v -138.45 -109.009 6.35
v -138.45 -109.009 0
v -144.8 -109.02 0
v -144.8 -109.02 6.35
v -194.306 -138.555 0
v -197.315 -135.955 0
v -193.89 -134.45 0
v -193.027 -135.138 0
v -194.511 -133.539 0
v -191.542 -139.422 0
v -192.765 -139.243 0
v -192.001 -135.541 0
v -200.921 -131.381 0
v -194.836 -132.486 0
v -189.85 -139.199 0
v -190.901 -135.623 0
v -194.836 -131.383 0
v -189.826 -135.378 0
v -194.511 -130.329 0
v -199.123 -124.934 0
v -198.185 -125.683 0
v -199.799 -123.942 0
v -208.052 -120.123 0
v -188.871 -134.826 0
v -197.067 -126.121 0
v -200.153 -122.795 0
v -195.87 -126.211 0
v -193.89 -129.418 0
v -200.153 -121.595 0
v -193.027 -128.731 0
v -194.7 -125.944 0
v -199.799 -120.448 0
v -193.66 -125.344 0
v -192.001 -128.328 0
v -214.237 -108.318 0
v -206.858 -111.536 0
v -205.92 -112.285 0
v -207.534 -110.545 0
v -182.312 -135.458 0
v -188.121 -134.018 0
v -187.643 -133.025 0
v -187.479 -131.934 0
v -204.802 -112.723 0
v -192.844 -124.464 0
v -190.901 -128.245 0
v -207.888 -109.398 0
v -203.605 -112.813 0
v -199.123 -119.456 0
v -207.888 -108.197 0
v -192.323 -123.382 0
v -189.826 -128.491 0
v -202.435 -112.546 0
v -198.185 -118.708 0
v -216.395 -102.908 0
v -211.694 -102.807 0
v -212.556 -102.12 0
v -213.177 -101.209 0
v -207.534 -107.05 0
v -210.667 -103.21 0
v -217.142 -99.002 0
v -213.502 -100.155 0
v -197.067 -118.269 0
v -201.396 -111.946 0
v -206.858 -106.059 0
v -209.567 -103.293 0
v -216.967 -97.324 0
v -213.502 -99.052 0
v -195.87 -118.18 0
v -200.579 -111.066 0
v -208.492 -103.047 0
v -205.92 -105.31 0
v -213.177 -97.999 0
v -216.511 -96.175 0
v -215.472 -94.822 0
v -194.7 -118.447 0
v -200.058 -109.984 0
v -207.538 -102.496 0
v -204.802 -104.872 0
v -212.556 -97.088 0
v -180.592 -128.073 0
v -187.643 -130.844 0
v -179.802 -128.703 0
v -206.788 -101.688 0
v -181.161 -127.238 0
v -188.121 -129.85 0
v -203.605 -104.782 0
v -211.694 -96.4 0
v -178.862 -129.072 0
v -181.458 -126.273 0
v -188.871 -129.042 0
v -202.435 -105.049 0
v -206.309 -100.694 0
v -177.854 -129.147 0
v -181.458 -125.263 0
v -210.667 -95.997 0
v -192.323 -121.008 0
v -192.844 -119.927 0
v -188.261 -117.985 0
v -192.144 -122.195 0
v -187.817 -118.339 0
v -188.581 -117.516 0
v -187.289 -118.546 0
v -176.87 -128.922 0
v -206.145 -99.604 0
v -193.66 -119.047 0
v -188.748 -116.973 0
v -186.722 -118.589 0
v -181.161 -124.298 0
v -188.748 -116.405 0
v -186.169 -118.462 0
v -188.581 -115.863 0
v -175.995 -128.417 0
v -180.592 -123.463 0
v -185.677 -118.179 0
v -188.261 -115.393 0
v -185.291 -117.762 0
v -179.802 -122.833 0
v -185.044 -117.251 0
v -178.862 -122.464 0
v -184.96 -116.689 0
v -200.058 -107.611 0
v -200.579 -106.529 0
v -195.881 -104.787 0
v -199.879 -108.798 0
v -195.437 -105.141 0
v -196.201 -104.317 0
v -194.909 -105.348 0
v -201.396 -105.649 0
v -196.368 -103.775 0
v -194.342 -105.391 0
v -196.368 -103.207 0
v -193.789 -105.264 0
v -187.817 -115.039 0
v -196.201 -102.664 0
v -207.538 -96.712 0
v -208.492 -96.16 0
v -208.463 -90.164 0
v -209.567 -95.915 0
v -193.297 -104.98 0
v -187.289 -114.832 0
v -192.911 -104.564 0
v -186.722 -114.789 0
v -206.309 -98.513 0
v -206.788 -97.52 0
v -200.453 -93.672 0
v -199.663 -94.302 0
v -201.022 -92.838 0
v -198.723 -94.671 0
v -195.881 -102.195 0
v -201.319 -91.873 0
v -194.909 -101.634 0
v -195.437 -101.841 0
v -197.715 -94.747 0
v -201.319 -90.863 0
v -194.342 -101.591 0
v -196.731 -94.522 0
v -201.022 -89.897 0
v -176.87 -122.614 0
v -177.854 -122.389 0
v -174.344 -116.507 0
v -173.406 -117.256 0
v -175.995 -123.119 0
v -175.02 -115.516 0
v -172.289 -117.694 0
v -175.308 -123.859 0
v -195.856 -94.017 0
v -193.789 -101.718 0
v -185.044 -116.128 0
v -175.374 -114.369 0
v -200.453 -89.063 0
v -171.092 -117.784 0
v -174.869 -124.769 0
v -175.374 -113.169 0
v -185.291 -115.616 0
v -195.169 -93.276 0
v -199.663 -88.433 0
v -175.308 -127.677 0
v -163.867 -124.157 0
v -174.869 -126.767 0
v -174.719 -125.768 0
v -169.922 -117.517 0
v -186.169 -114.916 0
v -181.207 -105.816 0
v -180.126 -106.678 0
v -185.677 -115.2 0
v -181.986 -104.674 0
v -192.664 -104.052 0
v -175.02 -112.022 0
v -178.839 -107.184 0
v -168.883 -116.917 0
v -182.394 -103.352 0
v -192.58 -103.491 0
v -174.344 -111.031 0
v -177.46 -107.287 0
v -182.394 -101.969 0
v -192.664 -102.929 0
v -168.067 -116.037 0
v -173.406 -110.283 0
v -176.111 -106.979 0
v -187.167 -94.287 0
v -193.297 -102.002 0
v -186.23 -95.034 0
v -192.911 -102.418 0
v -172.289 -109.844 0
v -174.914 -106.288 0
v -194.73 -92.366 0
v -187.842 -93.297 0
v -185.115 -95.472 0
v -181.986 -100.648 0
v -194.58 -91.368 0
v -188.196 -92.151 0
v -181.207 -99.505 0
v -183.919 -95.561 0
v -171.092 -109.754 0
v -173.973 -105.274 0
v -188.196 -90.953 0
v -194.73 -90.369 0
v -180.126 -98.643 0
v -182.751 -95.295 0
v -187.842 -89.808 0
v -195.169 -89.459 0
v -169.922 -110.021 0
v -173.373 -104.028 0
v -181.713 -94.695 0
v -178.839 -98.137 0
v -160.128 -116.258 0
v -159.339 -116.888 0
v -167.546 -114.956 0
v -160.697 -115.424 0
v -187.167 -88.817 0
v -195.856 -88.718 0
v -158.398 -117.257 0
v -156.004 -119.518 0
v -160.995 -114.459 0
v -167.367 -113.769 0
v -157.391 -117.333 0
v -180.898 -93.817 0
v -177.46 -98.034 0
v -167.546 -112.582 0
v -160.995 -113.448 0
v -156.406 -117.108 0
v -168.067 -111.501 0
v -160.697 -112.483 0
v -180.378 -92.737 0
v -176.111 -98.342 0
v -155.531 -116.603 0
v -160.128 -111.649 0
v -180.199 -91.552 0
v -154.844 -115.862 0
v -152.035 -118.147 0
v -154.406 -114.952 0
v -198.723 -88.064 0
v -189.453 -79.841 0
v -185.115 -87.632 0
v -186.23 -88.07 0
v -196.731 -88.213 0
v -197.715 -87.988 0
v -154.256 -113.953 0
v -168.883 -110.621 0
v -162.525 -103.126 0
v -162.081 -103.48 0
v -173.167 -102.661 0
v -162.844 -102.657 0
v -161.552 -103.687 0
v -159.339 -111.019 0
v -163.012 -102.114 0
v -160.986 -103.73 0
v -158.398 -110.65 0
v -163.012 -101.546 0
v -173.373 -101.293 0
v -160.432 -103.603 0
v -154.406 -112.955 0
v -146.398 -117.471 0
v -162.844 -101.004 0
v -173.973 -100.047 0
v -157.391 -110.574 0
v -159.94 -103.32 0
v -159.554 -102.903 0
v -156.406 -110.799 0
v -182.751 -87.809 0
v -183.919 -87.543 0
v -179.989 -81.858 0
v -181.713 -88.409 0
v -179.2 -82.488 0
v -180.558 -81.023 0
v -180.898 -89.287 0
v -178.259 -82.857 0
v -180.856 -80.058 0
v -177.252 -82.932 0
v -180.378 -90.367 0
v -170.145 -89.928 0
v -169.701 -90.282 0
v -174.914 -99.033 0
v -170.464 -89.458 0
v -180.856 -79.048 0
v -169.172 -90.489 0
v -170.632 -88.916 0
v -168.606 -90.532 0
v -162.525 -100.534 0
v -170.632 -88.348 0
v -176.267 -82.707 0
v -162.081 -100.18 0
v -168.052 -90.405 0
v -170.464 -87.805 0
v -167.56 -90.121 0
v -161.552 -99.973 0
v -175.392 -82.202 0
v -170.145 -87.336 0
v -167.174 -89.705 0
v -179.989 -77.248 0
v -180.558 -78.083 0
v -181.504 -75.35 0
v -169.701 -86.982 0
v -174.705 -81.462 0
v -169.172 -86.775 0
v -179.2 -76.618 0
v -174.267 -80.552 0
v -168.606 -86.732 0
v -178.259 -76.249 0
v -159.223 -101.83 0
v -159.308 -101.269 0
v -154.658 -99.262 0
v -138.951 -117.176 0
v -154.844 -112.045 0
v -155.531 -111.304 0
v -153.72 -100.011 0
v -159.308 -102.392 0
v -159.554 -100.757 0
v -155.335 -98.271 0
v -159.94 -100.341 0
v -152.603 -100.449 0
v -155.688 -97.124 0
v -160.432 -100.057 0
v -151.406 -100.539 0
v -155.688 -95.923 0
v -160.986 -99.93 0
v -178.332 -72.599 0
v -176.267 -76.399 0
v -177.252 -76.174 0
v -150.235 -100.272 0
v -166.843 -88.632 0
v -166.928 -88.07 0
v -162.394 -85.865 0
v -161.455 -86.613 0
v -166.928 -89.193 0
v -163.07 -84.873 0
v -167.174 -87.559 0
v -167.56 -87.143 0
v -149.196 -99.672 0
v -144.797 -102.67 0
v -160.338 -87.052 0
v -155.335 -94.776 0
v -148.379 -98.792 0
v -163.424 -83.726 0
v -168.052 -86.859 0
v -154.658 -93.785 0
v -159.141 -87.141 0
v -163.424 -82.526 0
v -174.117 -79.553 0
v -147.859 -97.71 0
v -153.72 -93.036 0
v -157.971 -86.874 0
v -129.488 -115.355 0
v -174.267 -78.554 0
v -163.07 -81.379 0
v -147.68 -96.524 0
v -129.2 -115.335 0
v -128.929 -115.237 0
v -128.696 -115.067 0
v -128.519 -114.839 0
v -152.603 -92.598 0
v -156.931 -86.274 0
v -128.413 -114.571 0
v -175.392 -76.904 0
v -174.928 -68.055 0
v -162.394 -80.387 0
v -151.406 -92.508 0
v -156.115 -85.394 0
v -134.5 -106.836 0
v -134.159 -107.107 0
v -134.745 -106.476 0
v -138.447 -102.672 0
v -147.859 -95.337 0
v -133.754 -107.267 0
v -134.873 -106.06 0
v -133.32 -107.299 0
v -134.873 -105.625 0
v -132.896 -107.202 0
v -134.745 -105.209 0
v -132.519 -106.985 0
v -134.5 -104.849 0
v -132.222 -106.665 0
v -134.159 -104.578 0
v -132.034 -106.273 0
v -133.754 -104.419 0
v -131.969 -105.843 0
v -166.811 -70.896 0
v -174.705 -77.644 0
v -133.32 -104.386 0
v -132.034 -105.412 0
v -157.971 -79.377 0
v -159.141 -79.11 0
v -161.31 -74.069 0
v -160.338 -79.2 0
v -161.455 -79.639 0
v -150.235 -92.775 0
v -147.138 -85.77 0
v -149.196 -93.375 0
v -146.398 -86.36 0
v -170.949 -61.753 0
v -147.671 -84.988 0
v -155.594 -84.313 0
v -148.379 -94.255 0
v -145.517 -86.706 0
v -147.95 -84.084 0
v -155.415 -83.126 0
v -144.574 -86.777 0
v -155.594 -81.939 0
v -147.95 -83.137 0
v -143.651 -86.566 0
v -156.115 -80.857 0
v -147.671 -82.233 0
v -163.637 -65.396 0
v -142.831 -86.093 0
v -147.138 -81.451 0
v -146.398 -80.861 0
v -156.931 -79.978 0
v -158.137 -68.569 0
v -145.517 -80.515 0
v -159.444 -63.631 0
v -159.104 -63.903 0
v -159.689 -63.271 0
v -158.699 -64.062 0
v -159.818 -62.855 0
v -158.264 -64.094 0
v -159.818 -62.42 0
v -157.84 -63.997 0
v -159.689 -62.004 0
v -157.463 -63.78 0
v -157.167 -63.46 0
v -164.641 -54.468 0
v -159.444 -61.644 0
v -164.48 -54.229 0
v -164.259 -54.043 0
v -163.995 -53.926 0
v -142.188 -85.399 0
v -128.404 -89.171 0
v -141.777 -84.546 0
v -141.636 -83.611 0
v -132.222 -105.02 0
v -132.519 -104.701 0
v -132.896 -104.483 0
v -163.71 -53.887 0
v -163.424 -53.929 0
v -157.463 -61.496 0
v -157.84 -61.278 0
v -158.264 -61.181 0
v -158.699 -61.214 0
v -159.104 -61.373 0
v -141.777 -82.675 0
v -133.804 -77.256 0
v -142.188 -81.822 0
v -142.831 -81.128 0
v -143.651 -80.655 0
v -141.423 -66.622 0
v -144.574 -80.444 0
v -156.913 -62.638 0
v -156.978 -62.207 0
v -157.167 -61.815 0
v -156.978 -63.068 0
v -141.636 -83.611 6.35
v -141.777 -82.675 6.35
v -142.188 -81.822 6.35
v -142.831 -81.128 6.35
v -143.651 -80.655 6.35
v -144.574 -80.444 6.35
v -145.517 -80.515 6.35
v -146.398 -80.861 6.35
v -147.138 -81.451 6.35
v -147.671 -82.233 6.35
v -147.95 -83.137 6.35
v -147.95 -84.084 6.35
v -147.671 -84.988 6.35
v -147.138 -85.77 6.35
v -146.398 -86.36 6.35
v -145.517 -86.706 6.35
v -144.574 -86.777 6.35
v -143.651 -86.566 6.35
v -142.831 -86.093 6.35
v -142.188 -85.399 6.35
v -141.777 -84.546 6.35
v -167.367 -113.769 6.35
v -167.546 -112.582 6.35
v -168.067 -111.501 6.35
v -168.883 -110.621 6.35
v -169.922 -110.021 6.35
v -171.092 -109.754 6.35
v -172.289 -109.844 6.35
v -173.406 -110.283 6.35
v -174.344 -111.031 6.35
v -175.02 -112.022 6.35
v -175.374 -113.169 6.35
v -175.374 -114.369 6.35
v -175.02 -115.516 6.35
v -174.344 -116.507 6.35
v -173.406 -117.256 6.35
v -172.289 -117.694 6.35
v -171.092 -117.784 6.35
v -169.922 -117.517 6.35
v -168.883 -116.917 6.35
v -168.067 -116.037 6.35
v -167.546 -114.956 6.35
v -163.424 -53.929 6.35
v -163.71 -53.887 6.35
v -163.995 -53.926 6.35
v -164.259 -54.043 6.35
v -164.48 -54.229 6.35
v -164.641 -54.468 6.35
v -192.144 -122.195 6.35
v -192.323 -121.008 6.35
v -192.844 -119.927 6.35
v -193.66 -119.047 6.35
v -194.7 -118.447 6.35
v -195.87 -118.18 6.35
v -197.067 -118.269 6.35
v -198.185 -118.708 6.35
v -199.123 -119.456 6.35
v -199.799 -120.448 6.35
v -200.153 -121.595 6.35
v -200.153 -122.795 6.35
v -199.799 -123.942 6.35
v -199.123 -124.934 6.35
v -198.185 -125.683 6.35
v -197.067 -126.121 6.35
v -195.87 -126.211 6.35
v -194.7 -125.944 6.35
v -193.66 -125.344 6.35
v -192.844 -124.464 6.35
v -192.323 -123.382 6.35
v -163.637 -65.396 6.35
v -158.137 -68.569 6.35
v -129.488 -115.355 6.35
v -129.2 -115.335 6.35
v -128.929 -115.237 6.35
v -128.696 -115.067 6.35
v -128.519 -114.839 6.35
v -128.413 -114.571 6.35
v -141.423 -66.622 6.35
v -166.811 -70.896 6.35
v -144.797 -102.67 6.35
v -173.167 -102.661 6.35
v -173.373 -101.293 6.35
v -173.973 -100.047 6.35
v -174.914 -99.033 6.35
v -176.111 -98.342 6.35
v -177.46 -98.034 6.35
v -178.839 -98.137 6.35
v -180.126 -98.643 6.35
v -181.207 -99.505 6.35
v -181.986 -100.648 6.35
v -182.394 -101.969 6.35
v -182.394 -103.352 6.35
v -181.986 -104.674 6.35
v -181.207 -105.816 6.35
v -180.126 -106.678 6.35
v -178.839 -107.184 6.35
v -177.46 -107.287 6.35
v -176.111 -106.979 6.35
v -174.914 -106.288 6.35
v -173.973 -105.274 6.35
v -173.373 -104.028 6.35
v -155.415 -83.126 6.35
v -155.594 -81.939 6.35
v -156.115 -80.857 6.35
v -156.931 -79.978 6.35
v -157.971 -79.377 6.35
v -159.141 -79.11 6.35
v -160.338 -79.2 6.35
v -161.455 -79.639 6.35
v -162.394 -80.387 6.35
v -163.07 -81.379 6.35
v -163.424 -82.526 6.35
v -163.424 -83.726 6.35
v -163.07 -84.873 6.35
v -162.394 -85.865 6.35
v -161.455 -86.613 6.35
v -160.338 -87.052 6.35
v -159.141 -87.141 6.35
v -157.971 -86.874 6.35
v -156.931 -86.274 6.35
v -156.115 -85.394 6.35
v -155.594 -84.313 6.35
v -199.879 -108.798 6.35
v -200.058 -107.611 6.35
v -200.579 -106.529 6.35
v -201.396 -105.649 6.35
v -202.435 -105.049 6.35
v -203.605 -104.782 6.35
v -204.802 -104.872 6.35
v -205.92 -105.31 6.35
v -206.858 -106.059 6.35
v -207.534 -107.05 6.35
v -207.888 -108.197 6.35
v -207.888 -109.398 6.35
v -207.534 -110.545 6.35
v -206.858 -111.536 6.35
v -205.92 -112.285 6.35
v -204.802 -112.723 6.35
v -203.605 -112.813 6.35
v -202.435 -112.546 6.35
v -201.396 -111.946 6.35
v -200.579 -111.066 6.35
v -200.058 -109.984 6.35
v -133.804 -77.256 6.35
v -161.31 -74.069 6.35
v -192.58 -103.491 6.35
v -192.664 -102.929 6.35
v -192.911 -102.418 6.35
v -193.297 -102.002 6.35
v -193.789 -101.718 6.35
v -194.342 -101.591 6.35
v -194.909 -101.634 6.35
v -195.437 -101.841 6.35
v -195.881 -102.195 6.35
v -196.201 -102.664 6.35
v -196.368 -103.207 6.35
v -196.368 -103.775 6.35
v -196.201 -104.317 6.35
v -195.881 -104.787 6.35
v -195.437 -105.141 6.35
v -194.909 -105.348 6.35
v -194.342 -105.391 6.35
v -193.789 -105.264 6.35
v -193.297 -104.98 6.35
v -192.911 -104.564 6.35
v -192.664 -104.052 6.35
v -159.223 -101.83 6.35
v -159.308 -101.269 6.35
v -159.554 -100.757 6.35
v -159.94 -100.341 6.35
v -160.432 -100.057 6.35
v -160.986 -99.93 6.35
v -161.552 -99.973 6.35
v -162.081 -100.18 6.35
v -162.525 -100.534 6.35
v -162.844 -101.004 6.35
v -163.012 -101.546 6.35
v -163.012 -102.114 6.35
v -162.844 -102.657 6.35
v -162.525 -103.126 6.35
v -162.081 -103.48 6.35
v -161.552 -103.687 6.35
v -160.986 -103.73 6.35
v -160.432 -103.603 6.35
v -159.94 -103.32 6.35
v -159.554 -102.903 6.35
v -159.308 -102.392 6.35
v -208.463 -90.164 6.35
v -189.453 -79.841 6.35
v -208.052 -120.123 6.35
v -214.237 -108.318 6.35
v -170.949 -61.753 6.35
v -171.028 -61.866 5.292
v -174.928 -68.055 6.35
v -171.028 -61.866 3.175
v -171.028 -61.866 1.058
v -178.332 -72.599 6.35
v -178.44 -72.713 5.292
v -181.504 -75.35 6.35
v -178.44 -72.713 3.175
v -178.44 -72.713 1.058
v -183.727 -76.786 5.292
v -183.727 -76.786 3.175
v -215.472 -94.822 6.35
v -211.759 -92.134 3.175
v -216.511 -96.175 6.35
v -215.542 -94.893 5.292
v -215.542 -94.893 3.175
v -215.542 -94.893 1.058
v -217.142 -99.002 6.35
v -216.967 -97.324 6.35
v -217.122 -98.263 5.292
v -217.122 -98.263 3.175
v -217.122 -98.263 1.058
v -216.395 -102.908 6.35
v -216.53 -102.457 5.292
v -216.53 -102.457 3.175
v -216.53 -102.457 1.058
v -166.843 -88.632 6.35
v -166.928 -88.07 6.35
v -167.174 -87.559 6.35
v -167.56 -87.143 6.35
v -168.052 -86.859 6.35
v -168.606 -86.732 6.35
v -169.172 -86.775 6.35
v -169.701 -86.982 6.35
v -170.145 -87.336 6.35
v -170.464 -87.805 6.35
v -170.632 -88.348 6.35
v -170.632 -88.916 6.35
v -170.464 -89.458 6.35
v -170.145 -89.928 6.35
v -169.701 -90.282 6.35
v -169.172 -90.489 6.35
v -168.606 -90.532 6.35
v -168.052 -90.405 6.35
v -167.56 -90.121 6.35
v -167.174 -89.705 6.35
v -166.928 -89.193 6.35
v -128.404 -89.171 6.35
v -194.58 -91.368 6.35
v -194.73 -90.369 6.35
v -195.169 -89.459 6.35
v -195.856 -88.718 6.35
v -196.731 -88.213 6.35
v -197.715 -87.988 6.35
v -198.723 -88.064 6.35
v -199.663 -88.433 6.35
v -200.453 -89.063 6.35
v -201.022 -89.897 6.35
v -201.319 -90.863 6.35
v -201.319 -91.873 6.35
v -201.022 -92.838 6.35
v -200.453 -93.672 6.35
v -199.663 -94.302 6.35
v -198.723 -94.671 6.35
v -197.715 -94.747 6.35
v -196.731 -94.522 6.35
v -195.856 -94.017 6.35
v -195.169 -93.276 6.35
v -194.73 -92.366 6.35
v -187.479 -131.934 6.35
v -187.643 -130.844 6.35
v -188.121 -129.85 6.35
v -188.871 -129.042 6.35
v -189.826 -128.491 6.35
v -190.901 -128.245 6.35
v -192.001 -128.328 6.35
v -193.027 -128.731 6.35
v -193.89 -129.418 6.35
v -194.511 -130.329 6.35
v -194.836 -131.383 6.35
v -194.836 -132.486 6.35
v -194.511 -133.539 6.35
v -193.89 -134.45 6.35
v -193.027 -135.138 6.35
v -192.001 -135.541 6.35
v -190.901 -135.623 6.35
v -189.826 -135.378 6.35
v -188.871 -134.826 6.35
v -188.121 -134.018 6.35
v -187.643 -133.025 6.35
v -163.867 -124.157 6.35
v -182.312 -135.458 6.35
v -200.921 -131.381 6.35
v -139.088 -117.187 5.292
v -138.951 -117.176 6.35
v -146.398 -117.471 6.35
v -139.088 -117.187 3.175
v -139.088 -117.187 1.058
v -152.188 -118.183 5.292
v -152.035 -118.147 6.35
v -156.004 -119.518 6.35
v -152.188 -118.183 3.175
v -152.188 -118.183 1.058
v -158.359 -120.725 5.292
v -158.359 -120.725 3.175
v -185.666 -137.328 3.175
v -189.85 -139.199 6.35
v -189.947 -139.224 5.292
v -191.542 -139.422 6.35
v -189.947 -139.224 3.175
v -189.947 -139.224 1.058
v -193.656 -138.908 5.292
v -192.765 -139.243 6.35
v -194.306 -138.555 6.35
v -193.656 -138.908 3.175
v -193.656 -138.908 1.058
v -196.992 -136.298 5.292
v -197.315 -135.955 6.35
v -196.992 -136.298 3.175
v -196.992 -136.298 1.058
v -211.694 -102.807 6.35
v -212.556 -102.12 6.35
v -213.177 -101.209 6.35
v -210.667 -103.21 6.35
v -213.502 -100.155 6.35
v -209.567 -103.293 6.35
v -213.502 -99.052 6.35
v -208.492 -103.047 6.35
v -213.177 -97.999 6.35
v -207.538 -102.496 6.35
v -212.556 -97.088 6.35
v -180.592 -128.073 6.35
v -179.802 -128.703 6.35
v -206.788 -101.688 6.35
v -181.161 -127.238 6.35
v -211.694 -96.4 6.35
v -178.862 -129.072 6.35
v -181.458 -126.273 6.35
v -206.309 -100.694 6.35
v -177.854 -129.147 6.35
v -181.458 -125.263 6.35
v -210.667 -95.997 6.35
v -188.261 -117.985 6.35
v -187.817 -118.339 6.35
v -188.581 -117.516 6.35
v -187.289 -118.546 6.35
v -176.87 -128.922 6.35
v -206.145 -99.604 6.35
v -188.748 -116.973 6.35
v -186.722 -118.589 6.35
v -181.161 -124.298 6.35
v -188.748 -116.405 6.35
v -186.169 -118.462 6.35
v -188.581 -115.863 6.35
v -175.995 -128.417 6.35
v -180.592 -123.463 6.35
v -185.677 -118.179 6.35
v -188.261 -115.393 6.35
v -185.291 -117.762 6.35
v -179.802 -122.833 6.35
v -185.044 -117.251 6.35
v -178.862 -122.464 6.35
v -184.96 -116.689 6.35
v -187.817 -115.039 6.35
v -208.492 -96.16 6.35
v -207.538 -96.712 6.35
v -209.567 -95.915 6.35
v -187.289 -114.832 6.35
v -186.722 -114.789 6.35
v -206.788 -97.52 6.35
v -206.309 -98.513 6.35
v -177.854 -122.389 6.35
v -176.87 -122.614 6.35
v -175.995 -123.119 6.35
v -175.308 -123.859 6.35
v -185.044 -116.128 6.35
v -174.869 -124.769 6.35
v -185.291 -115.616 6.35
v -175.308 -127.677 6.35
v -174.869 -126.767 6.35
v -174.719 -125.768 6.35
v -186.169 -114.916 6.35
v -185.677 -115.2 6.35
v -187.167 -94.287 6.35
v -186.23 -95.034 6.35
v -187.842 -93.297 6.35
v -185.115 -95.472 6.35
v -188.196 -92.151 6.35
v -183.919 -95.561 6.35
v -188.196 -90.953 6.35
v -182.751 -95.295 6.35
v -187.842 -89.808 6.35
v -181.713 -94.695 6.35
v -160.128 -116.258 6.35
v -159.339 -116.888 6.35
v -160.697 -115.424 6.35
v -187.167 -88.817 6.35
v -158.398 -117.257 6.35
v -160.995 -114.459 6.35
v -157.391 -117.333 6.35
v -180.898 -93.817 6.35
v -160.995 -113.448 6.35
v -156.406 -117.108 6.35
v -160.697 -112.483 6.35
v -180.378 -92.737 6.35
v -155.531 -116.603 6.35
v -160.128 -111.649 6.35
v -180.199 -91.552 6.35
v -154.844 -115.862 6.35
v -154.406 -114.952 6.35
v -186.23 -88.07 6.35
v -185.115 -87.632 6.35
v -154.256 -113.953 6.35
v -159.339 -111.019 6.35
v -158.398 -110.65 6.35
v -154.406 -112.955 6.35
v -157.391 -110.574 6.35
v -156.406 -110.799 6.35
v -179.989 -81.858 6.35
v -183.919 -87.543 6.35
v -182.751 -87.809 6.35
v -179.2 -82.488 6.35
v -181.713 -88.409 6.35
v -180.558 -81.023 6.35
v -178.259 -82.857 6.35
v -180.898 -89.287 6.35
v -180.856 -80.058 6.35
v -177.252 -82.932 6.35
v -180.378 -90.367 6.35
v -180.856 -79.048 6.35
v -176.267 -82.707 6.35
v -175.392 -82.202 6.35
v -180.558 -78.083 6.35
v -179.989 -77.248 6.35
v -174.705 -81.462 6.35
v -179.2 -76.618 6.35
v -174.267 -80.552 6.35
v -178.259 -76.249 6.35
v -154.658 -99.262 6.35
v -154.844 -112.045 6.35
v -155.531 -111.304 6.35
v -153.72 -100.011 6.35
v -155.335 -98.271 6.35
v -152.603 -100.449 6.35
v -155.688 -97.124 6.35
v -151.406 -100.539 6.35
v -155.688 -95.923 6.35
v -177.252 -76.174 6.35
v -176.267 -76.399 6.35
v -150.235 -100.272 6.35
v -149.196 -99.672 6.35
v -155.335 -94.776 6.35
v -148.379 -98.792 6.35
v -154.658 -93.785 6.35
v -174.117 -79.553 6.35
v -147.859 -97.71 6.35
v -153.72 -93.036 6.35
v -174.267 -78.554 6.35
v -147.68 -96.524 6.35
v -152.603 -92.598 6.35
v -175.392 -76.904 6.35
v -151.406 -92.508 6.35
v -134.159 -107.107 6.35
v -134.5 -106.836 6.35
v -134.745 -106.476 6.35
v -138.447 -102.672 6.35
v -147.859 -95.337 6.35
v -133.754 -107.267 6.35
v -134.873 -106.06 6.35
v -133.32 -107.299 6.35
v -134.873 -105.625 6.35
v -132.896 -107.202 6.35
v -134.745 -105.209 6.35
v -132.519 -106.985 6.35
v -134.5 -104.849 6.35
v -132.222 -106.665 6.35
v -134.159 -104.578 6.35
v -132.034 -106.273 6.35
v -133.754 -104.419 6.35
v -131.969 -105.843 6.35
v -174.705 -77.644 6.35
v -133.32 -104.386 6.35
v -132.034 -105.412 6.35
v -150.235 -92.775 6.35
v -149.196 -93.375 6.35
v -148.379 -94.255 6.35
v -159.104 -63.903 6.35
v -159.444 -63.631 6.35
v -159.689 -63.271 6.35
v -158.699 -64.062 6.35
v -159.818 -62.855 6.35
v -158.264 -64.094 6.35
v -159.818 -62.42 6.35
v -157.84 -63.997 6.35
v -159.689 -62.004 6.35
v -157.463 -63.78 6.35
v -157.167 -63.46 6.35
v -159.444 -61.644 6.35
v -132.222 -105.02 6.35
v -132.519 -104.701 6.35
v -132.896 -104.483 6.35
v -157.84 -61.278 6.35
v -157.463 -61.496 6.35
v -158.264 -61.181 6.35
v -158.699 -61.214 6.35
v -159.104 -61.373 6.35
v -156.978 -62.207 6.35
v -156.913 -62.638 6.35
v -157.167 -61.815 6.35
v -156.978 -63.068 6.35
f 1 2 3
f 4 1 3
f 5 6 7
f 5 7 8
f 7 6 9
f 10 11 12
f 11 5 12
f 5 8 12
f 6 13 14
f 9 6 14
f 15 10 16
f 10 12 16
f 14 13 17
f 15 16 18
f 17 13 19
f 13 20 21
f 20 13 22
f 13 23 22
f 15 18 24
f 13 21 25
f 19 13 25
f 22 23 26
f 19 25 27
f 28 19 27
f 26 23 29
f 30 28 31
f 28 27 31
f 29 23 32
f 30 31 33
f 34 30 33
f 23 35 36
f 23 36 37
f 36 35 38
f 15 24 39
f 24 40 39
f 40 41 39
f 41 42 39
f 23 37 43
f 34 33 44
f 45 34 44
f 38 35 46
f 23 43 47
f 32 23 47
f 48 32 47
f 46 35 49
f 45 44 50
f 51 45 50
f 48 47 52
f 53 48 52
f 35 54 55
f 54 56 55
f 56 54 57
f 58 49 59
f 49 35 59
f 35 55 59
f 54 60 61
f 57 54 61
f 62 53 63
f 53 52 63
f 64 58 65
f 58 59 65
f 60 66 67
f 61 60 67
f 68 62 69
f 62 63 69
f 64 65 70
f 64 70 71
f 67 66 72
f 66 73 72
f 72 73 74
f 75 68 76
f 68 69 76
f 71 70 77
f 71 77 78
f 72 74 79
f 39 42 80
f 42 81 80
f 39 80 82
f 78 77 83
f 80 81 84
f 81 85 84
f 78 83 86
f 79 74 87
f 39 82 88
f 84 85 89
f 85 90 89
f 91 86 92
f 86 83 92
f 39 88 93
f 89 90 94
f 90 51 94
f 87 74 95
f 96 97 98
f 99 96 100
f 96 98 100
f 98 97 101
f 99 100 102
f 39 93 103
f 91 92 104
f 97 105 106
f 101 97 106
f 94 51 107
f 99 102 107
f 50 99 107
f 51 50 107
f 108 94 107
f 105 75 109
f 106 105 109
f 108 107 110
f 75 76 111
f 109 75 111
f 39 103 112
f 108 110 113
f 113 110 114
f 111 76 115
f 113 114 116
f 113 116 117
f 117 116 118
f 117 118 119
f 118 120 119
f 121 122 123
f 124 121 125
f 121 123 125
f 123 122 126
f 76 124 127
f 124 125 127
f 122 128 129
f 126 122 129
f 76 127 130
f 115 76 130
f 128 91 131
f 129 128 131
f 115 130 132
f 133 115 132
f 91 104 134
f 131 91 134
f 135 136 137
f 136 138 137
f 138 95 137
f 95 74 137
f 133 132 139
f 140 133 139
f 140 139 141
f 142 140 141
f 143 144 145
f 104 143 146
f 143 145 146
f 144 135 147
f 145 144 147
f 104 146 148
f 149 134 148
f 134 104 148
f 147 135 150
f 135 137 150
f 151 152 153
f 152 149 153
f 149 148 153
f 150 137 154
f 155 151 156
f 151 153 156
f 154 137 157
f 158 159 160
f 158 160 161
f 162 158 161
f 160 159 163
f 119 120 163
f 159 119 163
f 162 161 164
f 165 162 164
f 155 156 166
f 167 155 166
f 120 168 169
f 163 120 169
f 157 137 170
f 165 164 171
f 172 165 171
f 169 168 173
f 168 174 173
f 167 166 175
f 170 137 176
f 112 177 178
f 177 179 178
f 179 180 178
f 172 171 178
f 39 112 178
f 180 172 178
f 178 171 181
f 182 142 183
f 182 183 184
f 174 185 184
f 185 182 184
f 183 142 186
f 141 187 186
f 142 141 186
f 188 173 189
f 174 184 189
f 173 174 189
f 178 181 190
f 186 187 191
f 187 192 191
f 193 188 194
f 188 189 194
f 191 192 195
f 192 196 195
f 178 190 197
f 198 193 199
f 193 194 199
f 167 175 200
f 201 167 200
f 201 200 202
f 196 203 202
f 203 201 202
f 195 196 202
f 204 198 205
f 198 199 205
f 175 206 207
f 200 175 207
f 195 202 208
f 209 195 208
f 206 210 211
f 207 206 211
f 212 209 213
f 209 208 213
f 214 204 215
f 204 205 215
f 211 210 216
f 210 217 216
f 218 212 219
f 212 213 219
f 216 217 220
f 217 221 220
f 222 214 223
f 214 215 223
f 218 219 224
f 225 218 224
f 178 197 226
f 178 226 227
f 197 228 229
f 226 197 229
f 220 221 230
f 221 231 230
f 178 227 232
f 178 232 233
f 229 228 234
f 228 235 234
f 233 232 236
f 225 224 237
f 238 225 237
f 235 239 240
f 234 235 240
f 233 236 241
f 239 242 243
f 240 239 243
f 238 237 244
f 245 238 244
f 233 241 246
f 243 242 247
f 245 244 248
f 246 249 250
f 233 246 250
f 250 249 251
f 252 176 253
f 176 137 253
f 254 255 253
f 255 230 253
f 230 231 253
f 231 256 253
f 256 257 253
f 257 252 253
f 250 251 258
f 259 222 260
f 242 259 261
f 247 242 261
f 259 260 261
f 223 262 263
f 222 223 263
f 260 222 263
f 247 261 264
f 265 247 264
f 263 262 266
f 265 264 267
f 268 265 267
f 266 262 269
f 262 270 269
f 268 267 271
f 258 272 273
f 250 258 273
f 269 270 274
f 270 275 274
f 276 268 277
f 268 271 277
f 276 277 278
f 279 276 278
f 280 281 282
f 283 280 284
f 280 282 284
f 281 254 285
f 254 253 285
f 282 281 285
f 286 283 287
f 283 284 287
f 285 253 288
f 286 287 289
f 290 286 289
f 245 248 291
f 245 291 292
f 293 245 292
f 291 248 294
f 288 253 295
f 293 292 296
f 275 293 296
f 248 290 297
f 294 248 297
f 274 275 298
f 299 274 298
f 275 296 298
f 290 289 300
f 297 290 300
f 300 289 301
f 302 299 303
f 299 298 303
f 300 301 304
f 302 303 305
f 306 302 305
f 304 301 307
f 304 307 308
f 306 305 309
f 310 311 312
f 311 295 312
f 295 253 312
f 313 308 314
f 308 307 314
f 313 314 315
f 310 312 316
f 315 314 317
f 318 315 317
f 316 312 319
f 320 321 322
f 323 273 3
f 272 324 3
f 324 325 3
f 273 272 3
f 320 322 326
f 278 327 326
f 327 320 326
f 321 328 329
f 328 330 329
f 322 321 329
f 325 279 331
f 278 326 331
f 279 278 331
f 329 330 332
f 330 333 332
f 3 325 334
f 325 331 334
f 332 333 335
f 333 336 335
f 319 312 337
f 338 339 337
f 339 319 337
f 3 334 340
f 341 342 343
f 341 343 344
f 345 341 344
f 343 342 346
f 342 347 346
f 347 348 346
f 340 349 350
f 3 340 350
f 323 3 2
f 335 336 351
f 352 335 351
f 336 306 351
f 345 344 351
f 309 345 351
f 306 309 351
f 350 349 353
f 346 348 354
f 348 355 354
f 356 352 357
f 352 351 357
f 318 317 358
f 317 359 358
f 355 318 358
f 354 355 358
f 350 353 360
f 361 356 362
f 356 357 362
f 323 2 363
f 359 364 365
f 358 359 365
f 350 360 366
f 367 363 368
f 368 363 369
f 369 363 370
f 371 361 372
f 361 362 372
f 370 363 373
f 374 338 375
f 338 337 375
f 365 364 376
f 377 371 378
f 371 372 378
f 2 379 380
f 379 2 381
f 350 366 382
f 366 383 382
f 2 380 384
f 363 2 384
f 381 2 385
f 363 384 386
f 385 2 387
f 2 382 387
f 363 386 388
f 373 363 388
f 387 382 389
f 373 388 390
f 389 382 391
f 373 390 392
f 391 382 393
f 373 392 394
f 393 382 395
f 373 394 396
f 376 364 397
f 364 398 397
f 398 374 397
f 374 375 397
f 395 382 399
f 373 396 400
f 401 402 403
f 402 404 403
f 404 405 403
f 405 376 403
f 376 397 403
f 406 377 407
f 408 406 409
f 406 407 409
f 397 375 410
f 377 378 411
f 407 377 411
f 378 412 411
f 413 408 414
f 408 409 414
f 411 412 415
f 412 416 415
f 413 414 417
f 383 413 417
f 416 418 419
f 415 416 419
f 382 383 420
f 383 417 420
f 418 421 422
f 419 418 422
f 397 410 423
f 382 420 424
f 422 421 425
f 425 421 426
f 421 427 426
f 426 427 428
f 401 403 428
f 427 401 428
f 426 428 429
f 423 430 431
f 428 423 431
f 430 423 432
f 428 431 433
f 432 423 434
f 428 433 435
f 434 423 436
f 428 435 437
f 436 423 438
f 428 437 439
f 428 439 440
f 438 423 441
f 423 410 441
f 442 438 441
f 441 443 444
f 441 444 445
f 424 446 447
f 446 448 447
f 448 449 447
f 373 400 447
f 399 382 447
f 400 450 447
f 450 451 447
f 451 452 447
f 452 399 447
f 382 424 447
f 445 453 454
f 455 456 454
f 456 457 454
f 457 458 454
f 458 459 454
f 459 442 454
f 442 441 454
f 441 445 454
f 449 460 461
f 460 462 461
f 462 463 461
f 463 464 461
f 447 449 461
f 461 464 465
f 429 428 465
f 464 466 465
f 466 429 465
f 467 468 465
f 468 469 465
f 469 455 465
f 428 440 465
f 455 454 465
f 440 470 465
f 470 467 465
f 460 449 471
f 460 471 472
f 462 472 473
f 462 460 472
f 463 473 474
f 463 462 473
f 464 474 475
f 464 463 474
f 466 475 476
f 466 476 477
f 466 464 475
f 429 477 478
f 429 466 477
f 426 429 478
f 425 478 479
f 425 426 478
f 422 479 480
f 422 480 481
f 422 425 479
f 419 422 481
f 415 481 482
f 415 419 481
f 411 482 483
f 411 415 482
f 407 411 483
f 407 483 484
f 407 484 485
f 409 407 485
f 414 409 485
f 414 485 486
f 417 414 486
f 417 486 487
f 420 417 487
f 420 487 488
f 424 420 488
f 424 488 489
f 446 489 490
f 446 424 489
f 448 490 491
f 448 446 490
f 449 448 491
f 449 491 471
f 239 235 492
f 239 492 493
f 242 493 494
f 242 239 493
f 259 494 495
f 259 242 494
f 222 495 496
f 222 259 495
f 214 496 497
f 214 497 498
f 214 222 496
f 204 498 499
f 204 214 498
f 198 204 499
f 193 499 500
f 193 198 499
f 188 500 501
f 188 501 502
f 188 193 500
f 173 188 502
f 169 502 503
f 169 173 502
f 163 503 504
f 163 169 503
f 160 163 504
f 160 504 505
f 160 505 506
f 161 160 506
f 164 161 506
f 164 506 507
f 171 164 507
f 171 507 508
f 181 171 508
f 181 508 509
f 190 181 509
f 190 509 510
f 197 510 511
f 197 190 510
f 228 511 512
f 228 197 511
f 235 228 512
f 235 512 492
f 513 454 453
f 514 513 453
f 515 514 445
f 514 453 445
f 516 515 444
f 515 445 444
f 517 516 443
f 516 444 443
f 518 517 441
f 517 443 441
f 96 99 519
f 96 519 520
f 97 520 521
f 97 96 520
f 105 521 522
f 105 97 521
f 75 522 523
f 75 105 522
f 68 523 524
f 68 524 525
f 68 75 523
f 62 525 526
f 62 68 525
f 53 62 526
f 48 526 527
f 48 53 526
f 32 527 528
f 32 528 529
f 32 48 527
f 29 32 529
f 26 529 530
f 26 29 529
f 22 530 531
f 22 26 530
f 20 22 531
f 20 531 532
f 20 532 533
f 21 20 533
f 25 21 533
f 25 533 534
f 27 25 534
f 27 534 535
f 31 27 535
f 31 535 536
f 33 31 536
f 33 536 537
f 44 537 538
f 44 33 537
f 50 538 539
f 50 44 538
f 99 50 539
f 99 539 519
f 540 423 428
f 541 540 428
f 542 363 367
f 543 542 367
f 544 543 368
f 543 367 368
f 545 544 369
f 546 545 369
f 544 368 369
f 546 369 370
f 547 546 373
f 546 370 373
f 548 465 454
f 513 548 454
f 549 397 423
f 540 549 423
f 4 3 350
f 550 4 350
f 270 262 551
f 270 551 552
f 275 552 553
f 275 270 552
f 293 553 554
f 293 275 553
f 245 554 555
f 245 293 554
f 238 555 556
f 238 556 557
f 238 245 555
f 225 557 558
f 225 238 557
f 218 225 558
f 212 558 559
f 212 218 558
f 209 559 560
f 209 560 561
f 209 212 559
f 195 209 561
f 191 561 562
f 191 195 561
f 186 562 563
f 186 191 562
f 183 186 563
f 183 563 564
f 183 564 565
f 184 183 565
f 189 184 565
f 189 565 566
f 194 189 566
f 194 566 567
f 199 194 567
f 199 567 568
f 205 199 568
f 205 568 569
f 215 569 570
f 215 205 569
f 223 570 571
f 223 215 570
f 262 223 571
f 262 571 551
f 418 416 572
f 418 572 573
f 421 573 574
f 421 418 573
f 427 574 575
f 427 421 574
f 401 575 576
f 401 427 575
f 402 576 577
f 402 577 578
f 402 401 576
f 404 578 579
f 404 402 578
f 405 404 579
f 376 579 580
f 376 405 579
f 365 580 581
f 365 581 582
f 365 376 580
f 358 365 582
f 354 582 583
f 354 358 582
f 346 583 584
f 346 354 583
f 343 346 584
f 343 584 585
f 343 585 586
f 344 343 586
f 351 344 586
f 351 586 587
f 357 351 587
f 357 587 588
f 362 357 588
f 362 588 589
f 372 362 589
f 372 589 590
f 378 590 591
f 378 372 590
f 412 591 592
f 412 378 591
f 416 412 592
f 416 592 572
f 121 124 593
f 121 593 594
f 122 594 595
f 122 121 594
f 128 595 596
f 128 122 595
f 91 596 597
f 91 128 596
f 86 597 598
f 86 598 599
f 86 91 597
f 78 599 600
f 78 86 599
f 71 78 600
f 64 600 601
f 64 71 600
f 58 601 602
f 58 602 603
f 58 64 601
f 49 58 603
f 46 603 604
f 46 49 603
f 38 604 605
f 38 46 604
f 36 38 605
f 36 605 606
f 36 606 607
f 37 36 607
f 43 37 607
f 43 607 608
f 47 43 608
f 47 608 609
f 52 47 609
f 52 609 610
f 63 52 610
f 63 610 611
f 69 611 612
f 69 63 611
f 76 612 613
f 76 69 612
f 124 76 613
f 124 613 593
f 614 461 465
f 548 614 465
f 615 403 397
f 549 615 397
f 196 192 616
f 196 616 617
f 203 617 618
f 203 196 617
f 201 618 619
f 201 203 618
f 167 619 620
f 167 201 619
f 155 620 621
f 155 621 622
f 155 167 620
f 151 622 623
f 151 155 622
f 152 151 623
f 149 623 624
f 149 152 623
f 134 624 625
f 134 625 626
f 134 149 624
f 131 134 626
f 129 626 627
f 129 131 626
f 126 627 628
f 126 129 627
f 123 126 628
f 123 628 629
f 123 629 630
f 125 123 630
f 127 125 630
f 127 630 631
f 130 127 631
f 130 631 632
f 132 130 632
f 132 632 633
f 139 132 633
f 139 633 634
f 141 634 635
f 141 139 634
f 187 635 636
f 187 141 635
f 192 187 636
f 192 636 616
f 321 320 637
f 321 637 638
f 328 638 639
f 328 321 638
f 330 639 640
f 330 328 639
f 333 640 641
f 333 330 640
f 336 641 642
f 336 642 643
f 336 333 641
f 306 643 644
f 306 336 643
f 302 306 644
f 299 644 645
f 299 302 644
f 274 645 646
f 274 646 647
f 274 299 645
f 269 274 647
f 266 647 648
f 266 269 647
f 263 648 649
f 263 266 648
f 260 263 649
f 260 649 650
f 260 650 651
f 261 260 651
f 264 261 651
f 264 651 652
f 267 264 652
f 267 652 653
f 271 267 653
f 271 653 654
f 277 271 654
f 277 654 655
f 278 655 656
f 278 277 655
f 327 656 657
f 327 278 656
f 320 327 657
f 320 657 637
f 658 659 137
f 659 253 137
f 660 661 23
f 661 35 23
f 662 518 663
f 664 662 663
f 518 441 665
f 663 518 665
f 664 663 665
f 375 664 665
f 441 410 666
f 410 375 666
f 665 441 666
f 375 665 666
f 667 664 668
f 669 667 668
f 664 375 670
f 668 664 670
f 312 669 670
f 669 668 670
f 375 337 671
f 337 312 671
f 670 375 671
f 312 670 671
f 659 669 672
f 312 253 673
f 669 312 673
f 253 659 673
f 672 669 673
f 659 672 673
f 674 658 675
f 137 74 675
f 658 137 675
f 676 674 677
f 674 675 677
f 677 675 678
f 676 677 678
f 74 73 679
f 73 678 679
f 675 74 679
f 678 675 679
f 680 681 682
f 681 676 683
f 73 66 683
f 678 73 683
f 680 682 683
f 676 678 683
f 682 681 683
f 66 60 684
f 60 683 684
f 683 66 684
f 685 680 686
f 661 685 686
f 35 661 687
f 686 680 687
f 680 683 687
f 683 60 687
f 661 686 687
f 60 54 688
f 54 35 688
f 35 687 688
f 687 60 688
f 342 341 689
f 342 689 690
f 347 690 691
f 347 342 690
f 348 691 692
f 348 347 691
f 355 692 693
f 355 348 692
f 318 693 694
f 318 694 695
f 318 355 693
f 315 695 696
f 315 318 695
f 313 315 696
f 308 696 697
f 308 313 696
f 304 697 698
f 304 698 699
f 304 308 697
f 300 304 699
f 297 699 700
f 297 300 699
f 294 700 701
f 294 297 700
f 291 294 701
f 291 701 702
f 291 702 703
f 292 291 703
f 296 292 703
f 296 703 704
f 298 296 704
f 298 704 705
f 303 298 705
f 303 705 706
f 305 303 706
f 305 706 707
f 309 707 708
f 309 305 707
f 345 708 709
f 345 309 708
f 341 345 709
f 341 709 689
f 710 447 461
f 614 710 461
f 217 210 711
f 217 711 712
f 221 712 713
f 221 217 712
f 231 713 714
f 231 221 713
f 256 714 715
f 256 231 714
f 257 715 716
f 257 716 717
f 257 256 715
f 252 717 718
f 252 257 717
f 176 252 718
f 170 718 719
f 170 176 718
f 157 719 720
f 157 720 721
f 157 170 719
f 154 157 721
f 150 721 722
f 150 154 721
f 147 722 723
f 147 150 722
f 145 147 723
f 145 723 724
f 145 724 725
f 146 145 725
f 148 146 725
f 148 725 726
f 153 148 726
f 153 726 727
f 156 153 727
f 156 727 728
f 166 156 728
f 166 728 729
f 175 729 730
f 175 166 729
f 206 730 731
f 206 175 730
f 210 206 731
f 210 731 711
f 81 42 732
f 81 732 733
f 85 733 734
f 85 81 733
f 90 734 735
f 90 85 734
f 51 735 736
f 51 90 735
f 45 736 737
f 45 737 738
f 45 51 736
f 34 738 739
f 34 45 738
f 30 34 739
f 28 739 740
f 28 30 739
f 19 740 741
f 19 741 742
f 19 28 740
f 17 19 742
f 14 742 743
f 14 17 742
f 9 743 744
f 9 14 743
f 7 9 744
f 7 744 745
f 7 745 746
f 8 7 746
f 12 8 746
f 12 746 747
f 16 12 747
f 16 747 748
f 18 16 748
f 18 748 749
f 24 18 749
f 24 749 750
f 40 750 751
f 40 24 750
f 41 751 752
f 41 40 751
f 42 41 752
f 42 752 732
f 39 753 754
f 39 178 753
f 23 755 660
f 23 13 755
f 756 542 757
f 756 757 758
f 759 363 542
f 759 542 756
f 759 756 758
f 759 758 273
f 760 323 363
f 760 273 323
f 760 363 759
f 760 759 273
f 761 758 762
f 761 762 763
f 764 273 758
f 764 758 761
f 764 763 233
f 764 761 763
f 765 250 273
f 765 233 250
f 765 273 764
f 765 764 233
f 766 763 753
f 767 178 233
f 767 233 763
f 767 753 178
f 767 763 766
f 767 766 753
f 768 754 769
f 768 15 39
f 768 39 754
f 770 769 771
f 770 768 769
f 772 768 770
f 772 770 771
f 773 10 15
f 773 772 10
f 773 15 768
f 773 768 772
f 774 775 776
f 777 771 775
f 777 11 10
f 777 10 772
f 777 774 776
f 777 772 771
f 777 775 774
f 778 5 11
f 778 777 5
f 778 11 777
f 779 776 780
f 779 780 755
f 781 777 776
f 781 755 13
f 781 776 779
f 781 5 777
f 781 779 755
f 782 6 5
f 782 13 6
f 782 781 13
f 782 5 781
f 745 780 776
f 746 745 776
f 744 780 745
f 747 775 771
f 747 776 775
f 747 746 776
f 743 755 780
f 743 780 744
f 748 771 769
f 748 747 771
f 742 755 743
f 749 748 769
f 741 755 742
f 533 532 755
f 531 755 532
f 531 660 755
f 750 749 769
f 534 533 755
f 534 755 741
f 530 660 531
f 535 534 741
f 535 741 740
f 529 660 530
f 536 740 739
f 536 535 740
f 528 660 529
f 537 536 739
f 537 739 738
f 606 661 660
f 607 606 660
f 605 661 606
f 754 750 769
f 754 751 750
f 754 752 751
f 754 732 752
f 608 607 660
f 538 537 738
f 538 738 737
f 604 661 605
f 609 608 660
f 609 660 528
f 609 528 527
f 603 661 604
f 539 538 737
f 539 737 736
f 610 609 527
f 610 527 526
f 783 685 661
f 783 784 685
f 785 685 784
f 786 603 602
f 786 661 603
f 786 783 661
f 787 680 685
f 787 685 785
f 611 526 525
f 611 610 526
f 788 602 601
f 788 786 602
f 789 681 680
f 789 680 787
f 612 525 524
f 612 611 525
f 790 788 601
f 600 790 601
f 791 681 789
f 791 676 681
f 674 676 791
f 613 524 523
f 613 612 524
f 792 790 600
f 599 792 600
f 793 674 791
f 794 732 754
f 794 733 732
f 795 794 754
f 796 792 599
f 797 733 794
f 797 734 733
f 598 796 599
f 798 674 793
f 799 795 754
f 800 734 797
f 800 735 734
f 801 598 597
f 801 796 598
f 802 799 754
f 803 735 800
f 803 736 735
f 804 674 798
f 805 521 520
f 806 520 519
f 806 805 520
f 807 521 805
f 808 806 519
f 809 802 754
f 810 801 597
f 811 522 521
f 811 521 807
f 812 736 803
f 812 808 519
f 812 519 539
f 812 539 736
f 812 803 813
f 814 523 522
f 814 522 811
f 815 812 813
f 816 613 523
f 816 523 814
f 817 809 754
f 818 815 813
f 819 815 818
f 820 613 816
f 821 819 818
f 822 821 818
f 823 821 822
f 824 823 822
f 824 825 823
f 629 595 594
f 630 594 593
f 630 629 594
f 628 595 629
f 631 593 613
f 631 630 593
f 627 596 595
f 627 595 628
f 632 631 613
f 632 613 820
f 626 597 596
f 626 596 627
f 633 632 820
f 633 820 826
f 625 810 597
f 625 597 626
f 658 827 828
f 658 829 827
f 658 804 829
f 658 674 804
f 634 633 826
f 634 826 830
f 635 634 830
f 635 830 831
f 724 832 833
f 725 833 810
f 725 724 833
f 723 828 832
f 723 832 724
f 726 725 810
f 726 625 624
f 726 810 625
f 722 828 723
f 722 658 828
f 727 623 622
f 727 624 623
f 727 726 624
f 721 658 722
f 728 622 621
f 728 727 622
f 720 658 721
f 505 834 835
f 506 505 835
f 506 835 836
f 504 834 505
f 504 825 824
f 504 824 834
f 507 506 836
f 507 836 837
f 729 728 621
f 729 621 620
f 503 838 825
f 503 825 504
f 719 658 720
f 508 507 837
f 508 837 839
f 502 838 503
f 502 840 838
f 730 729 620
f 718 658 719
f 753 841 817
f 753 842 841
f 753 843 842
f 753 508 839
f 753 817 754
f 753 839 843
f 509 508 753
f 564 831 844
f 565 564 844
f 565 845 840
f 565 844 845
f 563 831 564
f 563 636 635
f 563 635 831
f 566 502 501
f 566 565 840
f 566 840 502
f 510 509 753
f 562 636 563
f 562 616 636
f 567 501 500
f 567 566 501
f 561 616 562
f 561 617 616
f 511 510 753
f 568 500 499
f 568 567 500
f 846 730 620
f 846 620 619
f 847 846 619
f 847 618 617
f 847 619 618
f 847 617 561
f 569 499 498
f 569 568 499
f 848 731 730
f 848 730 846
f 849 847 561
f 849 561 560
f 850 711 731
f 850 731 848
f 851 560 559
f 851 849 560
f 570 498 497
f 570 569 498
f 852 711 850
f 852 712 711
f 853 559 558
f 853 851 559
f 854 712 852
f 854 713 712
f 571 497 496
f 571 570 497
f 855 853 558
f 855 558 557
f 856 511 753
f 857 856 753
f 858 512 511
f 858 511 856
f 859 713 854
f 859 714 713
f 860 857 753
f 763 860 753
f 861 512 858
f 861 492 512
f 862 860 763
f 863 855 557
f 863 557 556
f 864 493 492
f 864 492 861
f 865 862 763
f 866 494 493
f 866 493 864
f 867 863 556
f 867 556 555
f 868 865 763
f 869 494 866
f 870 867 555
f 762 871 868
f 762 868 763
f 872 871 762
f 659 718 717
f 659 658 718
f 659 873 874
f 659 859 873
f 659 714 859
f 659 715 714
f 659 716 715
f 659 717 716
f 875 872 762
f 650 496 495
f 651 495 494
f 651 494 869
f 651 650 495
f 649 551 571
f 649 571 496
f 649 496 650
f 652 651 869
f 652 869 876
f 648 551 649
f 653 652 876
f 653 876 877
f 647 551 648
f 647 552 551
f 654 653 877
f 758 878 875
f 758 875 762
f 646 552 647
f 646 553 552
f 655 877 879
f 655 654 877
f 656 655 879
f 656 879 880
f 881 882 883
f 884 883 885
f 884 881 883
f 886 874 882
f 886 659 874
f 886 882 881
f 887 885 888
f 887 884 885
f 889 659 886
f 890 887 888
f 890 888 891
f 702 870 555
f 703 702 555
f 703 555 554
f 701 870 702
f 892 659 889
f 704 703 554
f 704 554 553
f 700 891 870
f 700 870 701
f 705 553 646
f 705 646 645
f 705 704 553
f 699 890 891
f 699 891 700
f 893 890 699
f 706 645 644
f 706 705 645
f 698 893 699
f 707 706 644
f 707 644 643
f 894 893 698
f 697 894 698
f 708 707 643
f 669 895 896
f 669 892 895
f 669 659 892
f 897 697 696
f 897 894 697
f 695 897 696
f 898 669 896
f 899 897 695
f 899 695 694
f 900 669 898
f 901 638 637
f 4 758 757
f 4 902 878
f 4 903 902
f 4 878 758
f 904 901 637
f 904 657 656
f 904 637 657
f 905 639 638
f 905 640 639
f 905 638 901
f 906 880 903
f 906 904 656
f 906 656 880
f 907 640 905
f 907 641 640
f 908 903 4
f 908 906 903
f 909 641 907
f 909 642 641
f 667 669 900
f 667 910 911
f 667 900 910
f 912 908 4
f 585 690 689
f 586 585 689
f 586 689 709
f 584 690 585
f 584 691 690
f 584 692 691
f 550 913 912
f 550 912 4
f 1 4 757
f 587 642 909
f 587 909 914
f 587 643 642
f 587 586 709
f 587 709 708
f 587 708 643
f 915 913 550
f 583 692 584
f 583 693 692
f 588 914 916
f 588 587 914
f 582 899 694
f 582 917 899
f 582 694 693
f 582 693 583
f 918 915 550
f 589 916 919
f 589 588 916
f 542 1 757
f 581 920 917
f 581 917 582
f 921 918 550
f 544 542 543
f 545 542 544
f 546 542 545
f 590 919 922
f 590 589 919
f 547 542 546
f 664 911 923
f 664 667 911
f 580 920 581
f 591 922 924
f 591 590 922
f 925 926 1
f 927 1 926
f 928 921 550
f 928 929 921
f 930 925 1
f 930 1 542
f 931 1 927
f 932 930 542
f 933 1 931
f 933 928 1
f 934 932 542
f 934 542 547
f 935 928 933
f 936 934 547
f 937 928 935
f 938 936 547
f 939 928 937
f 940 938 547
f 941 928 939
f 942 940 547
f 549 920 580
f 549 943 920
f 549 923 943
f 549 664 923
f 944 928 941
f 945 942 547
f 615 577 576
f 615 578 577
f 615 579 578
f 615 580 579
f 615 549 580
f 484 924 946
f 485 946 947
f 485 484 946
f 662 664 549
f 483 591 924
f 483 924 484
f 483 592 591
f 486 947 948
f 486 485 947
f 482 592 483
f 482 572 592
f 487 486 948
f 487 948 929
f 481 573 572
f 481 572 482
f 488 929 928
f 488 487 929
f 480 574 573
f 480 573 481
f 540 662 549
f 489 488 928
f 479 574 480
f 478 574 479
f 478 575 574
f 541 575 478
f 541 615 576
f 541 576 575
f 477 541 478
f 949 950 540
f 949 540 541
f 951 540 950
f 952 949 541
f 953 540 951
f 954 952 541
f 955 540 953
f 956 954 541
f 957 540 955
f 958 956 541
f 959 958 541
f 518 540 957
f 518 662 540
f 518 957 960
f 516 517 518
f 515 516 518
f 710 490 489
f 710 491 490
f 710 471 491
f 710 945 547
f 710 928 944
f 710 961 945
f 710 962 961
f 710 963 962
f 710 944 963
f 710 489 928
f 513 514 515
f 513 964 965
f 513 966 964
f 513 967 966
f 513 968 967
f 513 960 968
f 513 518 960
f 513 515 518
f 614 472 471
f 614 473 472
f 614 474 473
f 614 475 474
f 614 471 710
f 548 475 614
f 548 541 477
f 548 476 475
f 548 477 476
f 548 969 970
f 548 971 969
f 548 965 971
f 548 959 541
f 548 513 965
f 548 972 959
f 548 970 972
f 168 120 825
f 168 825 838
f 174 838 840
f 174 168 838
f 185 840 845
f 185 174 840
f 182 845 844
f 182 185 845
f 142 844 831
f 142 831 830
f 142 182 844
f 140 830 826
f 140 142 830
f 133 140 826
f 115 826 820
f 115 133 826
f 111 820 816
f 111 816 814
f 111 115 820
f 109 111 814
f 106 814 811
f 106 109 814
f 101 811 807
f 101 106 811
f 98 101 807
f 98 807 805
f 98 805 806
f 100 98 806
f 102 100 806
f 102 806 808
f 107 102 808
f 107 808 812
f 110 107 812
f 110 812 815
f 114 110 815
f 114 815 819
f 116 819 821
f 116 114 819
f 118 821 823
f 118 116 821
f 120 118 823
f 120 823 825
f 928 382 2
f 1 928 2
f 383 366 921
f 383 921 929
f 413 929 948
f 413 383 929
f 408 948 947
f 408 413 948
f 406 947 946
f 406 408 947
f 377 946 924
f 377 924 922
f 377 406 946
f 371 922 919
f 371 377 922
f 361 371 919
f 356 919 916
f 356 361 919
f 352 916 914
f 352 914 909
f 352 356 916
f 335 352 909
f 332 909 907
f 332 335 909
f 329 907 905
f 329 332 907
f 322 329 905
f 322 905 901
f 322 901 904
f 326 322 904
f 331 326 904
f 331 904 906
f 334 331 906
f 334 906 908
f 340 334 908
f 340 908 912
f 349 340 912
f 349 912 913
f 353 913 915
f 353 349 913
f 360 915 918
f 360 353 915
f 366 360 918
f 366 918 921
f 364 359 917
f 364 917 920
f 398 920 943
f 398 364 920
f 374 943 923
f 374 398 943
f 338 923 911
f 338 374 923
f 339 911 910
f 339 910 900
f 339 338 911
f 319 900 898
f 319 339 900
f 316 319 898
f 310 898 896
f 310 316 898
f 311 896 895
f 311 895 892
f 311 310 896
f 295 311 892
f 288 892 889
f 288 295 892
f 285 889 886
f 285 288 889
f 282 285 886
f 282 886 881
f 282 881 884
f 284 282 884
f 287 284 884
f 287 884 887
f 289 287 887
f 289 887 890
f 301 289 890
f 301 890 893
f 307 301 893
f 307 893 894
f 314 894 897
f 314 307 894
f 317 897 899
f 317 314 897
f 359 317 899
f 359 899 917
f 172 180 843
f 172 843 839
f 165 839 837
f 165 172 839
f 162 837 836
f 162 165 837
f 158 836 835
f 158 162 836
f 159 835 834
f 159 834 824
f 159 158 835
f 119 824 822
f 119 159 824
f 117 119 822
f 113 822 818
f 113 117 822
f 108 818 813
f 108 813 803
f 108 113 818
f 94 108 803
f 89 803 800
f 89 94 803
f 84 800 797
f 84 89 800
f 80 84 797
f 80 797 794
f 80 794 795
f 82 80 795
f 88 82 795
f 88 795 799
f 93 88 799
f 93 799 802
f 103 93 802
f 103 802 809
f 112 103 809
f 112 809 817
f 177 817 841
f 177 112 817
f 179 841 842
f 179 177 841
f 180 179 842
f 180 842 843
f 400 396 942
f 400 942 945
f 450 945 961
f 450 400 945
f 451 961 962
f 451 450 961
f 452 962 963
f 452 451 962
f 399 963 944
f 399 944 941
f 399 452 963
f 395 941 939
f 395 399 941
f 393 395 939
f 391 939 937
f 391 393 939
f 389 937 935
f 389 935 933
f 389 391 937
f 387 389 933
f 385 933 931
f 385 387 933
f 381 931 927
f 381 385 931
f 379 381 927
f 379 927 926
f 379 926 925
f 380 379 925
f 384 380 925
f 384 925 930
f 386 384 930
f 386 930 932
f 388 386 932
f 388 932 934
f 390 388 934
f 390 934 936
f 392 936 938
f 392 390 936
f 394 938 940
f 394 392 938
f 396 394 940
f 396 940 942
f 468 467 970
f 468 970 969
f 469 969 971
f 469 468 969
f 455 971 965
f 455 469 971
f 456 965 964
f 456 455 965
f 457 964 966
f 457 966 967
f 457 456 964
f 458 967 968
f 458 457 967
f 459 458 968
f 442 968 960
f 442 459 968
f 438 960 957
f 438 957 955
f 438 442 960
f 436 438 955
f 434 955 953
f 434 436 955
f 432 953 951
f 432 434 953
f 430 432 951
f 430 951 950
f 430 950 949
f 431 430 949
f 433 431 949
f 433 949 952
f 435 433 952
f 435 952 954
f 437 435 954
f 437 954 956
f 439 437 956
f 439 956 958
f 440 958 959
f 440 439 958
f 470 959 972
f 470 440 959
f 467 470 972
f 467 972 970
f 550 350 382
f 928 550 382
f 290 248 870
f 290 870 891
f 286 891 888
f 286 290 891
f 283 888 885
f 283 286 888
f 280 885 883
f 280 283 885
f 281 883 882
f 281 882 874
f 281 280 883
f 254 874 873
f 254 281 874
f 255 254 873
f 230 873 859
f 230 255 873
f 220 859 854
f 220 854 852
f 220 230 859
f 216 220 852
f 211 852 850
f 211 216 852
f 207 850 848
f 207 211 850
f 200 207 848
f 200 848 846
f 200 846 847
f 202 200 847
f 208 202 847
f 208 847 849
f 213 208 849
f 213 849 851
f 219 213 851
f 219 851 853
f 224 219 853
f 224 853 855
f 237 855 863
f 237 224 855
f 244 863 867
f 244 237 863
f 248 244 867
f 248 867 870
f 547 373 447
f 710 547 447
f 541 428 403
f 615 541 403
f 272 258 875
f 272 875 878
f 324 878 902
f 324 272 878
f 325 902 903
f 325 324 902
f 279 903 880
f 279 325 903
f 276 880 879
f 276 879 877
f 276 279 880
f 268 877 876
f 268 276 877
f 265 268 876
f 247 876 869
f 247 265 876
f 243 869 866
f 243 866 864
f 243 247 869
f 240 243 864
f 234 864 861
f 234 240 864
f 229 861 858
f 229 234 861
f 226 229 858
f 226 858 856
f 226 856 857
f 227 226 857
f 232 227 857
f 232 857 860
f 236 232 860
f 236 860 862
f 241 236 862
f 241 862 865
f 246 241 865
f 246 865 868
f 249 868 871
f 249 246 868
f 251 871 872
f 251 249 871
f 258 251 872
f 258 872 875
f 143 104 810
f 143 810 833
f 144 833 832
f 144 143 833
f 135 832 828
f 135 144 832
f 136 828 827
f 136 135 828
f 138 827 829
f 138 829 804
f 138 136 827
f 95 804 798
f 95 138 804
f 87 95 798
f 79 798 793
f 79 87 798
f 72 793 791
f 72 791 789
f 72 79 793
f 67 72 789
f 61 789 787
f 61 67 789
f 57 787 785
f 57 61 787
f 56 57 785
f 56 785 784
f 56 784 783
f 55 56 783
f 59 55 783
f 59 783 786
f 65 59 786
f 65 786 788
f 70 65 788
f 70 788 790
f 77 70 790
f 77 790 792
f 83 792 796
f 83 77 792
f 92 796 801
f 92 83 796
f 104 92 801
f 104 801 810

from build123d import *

# Parameters (mm, degrees)
F0_R     = 3.6991956247
F0_R_2   = 4.026841149
F0_R_3   = 3.3886536063
F0_R_4   = 1.905
F0_R_5   = 4.6394749598
F0_R_6   = 4.0259
F0_R_7   = 1.4605
F0_R_8   = 4.0206111299
F0_R_9   = 3.175
F1_DEPTH = 6.35


with BuildPart() as f1:
    # F0 (on Top) → F1 (new body)
    with BuildSketch(Plane.XY):
        with BuildLine():
            Line((-141.4227864561, -66.6218475655), (-163.4241964397, -53.9294104972))
            ThreePointArc((-163.4241964397, -53.9294104972), (-164.1313397385, -53.975439652), (-164.6406632246, -54.4681463746))
            add(Edge.make_bspline(
                [(-164.6406632246, -54.4681463746), (-166.8207980796, -56.6978269307), (-171.528631351, -61.5126503269), (-177.767164735, -74.2020796991), (-190.4741100146, -80.1278343186), (-211.5090120019, -91.6224967819), (-220.2749544911, -97.9345025381), (-212.7776668762, -111.5448305395), (-208.0523381948, -120.1230359614)],
                knots=[0, 0, 0, 0, 0.1348504526, 0.2911991641, 0.4550987998, 0.6670528696, 0.7901528252, 1, 1, 1, 1], degree=3))
            add(Edge.make_bspline(
                [(-129.4876984449, -115.3548674096), (-132.5087258763, -116.1280792997), (-139.0324018879, -117.7977708115), (-153.1410367757, -116.8557845182), (-164.6263634526, -124.8974446251), (-185.0984841474, -137.3668728806), (-194.9478127257, -141.8023988863), (-202.9860587213, -128.5043933516), (-208.0523381948, -120.1230359614)],
                knots=[0, 0, 0, 0, 0.1348504526, 0.2911991641, 0.4550987998, 0.6670528696, 0.7901528252, 1, 1, 1, 1], degree=3))
            ThreePointArc((-129.4876984968, -115.3548674058), (-128.8063401905, -115.1601336713), (-128.4129061342, -114.5707441463))
            Line((-128.4129060967, -114.5707442098), (-128.404174042, -89.1707457108))
            Line((-128.404174042, -89.1707457108), (-133.8041937755, -77.255849794))
            Line((-133.8041937755, -77.255849794), (-141.4227864561, -66.6218475655))
        make_face()
        with Locations((-191.1778805534, -131.9342647815)):
            Circle(F0_R, mode=Mode.SUBTRACT)
        with Locations((-196.1711188502, -122.1951915252)):
            Circle(F0_R_2, mode=Mode.SUBTRACT)
        with Locations((-178.1075212771, -125.767988665)):
            Circle(F0_R_3, mode=Mode.SUBTRACT)
        with Locations((-209.8439335823, -99.6037125587)):
            Circle(F0_R, mode=Mode.SUBTRACT)
        with Locations((-203.9062678814, -108.7975203991)):
            Circle(F0_R_2, mode=Mode.SUBTRACT)
        with Locations((-186.8646724425, -116.6891495382)):
            Circle(F0_R_4, mode=Mode.SUBTRACT)
        with Locations((-194.4846724425, -103.4909223845)):
            Circle(F0_R_4, mode=Mode.SUBTRACT)
        with Locations((-177.8064009676, -102.6605359614)):
            Circle(F0_R_5, mode=Mode.SUBTRACT)
        with Locations((-171.3929009676, -113.7690438157)):
            Circle(F0_R_6, mode=Mode.SUBTRACT)
        with Locations((-157.6441997548, -113.9534844755)):
            Circle(F0_R_3, mode=Mode.SUBTRACT)
        with Locations((-161.1281294928, -101.8301495382)):
            Circle(F0_R_4, mode=Mode.SUBTRACT)
        Polygon((-144.7995185789, -109.020163878), (-144.7973355651, -102.67016399), (-138.4473359404, -102.6723470036), (-138.449514529, -109.009475081), align=None, mode=Mode.SUBTRACT)
        with Locations((-133.4291656805, -105.8426365719)):
            Circle(F0_R_7, mode=Mode.SUBTRACT)
        with Locations((-197.9686021805, -91.3675874472)):
            Circle(F0_R_3, mode=Mode.SUBTRACT)
        with Locations((-184.2199009676, -91.552028107)):
            Circle(F0_R_8, mode=Mode.SUBTRACT)
        with Locations((-177.5052806582, -79.5530832577)):
            Circle(F0_R_3, mode=Mode.SUBTRACT)
        with Locations((-168.7481294928, -88.6319223845)):
            Circle(F0_R_4, mode=Mode.SUBTRACT)
        with Locations((-151.7065340539, -96.5235515236)):
            Circle(F0_R_2, mode=Mode.SUBTRACT)
        with Locations((-159.4416830851, -83.1258803975)):
            Circle(F0_R_2, mode=Mode.SUBTRACT)
        with Locations((-144.8108330835, -83.6105359613)):
            Circle(F0_R_9, mode=Mode.SUBTRACT)
        Polygon((-158.1370971167, -68.5686802574), (-161.3102063838, -74.0690327533), (-166.8105591077, -70.8959233546), (-163.6374498407, -65.3955708587), align=None, mode=Mode.SUBTRACT)
        with Locations((-158.3735632902, -62.6376725477)):
            Circle(F0_R_7, mode=Mode.SUBTRACT)
    extrude(amount=F1_DEPTH)


solid = f1.part
